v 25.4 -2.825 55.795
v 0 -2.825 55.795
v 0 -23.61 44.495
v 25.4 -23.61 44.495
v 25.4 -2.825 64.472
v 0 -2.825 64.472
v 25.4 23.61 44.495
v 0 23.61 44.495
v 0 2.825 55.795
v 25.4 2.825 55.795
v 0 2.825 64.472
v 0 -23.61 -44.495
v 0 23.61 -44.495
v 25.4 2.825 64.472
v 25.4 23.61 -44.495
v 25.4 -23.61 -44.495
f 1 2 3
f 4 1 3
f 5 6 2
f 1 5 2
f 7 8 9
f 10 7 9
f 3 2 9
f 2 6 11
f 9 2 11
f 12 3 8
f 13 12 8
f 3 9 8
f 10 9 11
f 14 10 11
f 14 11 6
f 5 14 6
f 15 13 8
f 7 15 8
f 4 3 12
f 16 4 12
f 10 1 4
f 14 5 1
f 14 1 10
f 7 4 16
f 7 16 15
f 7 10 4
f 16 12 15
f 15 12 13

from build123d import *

# Parameters (mm, degrees)
F1_DEPTH = 25.4


with BuildPart() as f1:
    # F0 (on Right) → F1 (new body)
    with BuildSketch(Plane.YZ):
        Polygon((-23.609508, 44.494845), (-23.609508, -44.494845), (23.609508, -44.494845), (23.609508, 44.494845), (2.825069, 55.795118), (2.825069, 64.472117), (0, 64.472117), (-2.825069, 64.472117), (-2.825069, 55.795118), align=None)
    extrude(amount=F1_DEPTH)


solid = f1.part
